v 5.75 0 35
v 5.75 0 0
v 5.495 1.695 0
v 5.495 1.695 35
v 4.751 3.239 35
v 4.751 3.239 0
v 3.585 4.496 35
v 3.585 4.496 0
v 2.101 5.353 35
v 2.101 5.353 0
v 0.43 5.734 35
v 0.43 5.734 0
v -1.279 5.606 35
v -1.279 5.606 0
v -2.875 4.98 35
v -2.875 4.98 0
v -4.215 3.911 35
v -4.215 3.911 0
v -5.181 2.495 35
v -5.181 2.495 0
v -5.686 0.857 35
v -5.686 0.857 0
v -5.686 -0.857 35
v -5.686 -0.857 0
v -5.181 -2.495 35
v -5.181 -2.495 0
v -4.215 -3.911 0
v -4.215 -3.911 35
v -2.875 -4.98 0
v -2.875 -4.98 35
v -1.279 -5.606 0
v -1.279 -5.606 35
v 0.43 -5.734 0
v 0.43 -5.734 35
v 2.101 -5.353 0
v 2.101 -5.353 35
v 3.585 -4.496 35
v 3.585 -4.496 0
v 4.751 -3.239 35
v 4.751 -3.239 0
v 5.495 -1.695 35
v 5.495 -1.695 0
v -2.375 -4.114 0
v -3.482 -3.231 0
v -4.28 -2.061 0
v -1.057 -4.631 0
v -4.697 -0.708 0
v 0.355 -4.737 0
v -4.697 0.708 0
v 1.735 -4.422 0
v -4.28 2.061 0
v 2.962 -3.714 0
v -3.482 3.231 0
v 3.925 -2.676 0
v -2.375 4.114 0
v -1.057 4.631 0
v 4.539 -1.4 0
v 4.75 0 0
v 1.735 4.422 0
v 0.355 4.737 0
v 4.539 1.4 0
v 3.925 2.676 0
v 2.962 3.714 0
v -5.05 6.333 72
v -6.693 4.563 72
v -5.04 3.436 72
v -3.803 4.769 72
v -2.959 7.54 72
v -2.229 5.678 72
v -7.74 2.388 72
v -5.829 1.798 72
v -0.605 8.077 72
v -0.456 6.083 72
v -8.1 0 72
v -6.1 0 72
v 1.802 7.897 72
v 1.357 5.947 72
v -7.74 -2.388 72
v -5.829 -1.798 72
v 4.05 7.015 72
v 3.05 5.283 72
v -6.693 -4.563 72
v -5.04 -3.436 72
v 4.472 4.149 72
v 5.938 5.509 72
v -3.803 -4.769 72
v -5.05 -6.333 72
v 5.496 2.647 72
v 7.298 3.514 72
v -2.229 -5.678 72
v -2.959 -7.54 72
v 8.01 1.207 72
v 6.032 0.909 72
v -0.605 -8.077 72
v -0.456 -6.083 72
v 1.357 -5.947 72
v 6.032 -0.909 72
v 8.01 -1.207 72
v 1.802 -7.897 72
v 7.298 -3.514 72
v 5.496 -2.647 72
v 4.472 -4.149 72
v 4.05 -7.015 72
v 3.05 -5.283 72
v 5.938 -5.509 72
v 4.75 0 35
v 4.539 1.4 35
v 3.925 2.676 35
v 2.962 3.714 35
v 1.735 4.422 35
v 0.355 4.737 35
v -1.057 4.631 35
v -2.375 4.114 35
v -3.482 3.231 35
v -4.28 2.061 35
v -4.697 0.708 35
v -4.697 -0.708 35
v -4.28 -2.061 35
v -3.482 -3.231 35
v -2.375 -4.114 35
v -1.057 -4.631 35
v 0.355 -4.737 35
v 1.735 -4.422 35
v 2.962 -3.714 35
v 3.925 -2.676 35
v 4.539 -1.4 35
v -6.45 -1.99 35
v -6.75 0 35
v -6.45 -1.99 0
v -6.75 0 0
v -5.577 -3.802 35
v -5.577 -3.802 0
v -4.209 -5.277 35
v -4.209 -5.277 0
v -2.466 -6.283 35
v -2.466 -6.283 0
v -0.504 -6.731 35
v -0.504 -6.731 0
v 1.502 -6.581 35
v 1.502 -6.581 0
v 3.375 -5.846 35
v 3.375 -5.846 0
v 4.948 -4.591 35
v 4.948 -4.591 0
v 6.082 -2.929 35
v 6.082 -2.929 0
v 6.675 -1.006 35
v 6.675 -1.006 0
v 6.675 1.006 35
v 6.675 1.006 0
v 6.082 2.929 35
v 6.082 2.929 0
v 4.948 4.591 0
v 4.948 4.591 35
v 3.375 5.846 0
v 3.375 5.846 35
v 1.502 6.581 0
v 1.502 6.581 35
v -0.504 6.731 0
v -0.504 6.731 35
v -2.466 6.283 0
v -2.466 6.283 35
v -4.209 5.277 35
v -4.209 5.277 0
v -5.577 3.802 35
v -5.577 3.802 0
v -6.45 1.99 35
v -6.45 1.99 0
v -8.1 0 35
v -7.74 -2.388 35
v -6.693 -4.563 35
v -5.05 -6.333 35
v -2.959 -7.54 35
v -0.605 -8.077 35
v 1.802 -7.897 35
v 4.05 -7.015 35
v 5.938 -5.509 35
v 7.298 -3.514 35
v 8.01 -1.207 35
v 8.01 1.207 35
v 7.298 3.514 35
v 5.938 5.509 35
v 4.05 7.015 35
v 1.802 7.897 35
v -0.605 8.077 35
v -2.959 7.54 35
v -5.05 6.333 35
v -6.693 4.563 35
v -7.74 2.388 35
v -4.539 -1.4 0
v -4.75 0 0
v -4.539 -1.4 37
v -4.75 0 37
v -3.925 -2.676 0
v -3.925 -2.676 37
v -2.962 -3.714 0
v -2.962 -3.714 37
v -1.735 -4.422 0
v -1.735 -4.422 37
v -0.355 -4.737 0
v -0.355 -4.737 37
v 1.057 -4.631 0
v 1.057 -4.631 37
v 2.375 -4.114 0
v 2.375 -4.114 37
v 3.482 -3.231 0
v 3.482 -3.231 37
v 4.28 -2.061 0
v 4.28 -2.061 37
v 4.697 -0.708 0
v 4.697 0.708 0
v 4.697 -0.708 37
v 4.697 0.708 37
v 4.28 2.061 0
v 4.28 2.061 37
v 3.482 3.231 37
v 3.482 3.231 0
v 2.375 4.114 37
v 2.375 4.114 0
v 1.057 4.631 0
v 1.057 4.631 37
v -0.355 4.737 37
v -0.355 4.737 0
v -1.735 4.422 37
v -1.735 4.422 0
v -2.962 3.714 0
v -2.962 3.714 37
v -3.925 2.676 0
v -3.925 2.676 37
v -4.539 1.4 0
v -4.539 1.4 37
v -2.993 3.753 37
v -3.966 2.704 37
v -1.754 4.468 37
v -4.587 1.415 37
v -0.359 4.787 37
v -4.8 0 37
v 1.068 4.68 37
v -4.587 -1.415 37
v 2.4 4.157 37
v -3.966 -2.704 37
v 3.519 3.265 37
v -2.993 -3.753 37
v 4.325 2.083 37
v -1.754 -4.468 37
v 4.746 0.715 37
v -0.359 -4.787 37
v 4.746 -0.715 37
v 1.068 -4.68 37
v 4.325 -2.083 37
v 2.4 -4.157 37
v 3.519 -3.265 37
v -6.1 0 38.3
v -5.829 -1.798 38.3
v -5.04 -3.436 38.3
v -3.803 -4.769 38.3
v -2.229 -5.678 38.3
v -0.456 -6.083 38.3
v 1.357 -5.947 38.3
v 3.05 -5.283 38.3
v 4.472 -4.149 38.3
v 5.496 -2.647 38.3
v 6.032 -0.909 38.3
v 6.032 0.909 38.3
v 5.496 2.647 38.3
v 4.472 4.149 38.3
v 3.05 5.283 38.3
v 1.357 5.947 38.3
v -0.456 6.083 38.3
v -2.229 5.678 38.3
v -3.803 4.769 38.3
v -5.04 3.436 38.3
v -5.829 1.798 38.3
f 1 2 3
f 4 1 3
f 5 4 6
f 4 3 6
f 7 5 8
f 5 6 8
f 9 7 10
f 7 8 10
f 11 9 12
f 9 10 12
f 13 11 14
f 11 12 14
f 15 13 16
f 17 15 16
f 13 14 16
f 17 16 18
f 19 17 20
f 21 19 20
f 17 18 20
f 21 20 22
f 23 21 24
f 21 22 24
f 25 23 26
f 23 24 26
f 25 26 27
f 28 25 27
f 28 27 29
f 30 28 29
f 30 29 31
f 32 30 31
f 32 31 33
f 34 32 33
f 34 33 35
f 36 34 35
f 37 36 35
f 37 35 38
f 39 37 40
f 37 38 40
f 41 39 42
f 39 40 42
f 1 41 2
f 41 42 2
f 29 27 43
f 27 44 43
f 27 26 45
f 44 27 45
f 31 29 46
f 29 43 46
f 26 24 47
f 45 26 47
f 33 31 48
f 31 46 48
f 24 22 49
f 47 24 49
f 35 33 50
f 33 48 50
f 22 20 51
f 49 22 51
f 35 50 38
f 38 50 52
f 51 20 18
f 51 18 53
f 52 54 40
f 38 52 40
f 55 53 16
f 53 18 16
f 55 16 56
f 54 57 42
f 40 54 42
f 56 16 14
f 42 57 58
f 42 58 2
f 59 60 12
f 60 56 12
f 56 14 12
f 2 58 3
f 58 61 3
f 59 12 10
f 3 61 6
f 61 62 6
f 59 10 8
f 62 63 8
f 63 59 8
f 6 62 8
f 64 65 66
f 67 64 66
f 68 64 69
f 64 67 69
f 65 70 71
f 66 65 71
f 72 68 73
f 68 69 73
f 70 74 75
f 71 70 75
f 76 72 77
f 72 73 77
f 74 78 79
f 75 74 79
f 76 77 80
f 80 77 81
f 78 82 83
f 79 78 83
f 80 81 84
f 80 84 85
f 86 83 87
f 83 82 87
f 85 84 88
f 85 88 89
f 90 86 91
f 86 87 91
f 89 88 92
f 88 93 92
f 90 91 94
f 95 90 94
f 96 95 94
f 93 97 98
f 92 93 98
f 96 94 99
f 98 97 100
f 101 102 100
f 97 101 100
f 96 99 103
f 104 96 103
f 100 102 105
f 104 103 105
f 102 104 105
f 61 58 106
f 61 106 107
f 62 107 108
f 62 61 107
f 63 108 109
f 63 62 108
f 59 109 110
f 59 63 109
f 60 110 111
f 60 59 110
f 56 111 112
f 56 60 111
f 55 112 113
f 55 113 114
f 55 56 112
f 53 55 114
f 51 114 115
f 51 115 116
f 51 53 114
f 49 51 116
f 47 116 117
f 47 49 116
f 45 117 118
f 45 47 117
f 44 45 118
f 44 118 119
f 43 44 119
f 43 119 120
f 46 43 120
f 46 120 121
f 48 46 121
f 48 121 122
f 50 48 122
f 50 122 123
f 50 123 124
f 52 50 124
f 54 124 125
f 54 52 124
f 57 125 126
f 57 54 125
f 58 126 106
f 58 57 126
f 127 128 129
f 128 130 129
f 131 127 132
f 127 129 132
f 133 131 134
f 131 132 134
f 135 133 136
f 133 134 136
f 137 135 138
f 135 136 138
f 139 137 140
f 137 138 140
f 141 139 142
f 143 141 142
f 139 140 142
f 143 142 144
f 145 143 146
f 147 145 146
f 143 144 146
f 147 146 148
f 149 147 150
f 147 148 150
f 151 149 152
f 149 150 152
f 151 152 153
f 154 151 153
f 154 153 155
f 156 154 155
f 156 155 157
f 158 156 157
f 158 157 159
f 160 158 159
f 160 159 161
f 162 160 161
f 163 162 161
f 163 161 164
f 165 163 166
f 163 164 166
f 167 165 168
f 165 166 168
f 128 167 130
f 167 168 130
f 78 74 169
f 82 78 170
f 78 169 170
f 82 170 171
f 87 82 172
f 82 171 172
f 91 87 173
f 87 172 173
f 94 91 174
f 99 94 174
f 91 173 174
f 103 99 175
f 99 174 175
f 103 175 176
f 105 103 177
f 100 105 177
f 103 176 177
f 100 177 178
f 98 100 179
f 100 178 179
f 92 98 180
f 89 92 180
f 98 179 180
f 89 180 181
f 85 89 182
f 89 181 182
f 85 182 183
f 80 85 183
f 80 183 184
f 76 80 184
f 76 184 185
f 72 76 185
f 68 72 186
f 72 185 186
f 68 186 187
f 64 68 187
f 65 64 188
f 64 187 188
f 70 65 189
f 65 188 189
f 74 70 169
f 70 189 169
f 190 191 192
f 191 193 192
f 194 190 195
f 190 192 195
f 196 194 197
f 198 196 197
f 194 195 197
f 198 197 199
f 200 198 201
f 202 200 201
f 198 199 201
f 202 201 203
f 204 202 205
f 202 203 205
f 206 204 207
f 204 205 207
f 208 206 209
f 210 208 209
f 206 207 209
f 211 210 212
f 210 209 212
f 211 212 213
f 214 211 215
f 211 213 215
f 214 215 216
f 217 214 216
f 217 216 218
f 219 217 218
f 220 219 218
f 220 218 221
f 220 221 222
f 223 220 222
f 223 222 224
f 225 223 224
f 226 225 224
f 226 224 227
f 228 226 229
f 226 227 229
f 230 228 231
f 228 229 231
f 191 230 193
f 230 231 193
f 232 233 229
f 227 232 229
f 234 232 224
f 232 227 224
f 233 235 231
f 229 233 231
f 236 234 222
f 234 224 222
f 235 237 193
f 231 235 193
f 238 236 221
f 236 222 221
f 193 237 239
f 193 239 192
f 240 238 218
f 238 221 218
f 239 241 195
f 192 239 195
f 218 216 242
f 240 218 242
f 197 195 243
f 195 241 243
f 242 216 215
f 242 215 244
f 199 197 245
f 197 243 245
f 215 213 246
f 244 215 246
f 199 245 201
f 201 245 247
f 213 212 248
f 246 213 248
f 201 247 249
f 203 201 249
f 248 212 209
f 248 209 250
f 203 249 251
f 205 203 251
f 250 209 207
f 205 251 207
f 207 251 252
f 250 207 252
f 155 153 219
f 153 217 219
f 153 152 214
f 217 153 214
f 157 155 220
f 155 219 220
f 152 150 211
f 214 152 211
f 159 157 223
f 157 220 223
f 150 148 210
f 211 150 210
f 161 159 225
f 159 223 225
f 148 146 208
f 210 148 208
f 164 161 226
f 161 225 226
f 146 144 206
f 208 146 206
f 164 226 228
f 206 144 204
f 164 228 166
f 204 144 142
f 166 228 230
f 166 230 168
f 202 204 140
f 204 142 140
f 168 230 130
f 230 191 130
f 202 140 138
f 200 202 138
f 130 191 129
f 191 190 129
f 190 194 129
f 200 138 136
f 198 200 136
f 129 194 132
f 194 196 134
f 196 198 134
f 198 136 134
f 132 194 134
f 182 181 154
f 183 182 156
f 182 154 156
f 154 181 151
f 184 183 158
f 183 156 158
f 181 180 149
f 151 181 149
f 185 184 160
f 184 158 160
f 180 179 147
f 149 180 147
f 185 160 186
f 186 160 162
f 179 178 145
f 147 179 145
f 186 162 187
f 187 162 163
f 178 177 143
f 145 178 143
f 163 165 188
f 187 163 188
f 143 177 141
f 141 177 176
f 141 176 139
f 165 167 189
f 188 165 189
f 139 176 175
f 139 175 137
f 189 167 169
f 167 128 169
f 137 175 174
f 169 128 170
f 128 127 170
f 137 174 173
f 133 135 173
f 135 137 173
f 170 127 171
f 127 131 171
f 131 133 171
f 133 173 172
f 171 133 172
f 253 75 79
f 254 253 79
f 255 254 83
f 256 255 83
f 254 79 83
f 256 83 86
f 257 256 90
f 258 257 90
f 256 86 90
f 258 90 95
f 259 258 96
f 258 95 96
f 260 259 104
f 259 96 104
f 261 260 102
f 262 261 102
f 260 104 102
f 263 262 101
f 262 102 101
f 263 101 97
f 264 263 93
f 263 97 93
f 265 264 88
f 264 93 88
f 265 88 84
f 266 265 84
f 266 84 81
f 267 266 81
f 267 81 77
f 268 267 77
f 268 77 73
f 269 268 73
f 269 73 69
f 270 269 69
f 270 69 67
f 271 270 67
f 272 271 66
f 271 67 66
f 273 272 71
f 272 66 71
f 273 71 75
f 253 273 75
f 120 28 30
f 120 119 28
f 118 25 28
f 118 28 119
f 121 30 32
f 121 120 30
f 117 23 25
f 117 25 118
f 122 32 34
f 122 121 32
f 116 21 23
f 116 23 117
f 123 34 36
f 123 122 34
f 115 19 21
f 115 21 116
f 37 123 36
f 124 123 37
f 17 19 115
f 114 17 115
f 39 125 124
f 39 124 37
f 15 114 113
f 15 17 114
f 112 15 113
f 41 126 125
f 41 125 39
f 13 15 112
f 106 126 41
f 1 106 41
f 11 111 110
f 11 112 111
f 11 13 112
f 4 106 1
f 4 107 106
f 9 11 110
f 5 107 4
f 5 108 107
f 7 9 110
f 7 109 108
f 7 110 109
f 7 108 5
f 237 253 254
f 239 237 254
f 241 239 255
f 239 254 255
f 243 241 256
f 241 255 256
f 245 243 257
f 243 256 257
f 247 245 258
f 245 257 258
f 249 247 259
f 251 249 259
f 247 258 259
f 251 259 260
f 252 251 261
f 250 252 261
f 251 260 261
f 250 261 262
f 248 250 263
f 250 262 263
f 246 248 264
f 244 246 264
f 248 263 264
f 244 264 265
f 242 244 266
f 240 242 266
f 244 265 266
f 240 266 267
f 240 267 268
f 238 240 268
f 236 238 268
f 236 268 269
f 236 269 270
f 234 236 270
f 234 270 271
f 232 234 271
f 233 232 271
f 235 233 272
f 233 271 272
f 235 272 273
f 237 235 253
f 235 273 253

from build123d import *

# Parameters (mm, degrees)
SKETCH_R     = 5.75
SKETCH_R_2   = 4.75
PAD_DEPTH    = 35
CHAMFER_SIZE = 1.3


with BuildPart() as body:
    # Sketch → Pad (new body)
    with BuildSketch(Plane.XY):
        Circle(SKETCH_R)
        Circle(SKETCH_R_2, mode=Mode.SUBTRACT)
    extrude(amount=PAD_DEPTH)


with BuildPart() as body001:
    # Sketch003 → Revolution (revolve)
    with BuildSketch(Plane.XZ):
        Polygon((-6.75, 35), (-6.75, 0), (-4.75, 0), (-4.75, 37), (-6.1, 37), (-6.1, 72), (-8.1, 72), (-8.1, 35), align=None)
    revolve(axis=Axis((0, 0, 0), (0, 0, 1)))

    # Chamfer
    chamfer_edges = [body001.edges().sort_by_distance(p)[0] for p in [
        (6.1, 0, 37),
    ]]
    chamfer(chamfer_edges, length=CHAMFER_SIZE)


solid = Compound([body.part, body001.part])
